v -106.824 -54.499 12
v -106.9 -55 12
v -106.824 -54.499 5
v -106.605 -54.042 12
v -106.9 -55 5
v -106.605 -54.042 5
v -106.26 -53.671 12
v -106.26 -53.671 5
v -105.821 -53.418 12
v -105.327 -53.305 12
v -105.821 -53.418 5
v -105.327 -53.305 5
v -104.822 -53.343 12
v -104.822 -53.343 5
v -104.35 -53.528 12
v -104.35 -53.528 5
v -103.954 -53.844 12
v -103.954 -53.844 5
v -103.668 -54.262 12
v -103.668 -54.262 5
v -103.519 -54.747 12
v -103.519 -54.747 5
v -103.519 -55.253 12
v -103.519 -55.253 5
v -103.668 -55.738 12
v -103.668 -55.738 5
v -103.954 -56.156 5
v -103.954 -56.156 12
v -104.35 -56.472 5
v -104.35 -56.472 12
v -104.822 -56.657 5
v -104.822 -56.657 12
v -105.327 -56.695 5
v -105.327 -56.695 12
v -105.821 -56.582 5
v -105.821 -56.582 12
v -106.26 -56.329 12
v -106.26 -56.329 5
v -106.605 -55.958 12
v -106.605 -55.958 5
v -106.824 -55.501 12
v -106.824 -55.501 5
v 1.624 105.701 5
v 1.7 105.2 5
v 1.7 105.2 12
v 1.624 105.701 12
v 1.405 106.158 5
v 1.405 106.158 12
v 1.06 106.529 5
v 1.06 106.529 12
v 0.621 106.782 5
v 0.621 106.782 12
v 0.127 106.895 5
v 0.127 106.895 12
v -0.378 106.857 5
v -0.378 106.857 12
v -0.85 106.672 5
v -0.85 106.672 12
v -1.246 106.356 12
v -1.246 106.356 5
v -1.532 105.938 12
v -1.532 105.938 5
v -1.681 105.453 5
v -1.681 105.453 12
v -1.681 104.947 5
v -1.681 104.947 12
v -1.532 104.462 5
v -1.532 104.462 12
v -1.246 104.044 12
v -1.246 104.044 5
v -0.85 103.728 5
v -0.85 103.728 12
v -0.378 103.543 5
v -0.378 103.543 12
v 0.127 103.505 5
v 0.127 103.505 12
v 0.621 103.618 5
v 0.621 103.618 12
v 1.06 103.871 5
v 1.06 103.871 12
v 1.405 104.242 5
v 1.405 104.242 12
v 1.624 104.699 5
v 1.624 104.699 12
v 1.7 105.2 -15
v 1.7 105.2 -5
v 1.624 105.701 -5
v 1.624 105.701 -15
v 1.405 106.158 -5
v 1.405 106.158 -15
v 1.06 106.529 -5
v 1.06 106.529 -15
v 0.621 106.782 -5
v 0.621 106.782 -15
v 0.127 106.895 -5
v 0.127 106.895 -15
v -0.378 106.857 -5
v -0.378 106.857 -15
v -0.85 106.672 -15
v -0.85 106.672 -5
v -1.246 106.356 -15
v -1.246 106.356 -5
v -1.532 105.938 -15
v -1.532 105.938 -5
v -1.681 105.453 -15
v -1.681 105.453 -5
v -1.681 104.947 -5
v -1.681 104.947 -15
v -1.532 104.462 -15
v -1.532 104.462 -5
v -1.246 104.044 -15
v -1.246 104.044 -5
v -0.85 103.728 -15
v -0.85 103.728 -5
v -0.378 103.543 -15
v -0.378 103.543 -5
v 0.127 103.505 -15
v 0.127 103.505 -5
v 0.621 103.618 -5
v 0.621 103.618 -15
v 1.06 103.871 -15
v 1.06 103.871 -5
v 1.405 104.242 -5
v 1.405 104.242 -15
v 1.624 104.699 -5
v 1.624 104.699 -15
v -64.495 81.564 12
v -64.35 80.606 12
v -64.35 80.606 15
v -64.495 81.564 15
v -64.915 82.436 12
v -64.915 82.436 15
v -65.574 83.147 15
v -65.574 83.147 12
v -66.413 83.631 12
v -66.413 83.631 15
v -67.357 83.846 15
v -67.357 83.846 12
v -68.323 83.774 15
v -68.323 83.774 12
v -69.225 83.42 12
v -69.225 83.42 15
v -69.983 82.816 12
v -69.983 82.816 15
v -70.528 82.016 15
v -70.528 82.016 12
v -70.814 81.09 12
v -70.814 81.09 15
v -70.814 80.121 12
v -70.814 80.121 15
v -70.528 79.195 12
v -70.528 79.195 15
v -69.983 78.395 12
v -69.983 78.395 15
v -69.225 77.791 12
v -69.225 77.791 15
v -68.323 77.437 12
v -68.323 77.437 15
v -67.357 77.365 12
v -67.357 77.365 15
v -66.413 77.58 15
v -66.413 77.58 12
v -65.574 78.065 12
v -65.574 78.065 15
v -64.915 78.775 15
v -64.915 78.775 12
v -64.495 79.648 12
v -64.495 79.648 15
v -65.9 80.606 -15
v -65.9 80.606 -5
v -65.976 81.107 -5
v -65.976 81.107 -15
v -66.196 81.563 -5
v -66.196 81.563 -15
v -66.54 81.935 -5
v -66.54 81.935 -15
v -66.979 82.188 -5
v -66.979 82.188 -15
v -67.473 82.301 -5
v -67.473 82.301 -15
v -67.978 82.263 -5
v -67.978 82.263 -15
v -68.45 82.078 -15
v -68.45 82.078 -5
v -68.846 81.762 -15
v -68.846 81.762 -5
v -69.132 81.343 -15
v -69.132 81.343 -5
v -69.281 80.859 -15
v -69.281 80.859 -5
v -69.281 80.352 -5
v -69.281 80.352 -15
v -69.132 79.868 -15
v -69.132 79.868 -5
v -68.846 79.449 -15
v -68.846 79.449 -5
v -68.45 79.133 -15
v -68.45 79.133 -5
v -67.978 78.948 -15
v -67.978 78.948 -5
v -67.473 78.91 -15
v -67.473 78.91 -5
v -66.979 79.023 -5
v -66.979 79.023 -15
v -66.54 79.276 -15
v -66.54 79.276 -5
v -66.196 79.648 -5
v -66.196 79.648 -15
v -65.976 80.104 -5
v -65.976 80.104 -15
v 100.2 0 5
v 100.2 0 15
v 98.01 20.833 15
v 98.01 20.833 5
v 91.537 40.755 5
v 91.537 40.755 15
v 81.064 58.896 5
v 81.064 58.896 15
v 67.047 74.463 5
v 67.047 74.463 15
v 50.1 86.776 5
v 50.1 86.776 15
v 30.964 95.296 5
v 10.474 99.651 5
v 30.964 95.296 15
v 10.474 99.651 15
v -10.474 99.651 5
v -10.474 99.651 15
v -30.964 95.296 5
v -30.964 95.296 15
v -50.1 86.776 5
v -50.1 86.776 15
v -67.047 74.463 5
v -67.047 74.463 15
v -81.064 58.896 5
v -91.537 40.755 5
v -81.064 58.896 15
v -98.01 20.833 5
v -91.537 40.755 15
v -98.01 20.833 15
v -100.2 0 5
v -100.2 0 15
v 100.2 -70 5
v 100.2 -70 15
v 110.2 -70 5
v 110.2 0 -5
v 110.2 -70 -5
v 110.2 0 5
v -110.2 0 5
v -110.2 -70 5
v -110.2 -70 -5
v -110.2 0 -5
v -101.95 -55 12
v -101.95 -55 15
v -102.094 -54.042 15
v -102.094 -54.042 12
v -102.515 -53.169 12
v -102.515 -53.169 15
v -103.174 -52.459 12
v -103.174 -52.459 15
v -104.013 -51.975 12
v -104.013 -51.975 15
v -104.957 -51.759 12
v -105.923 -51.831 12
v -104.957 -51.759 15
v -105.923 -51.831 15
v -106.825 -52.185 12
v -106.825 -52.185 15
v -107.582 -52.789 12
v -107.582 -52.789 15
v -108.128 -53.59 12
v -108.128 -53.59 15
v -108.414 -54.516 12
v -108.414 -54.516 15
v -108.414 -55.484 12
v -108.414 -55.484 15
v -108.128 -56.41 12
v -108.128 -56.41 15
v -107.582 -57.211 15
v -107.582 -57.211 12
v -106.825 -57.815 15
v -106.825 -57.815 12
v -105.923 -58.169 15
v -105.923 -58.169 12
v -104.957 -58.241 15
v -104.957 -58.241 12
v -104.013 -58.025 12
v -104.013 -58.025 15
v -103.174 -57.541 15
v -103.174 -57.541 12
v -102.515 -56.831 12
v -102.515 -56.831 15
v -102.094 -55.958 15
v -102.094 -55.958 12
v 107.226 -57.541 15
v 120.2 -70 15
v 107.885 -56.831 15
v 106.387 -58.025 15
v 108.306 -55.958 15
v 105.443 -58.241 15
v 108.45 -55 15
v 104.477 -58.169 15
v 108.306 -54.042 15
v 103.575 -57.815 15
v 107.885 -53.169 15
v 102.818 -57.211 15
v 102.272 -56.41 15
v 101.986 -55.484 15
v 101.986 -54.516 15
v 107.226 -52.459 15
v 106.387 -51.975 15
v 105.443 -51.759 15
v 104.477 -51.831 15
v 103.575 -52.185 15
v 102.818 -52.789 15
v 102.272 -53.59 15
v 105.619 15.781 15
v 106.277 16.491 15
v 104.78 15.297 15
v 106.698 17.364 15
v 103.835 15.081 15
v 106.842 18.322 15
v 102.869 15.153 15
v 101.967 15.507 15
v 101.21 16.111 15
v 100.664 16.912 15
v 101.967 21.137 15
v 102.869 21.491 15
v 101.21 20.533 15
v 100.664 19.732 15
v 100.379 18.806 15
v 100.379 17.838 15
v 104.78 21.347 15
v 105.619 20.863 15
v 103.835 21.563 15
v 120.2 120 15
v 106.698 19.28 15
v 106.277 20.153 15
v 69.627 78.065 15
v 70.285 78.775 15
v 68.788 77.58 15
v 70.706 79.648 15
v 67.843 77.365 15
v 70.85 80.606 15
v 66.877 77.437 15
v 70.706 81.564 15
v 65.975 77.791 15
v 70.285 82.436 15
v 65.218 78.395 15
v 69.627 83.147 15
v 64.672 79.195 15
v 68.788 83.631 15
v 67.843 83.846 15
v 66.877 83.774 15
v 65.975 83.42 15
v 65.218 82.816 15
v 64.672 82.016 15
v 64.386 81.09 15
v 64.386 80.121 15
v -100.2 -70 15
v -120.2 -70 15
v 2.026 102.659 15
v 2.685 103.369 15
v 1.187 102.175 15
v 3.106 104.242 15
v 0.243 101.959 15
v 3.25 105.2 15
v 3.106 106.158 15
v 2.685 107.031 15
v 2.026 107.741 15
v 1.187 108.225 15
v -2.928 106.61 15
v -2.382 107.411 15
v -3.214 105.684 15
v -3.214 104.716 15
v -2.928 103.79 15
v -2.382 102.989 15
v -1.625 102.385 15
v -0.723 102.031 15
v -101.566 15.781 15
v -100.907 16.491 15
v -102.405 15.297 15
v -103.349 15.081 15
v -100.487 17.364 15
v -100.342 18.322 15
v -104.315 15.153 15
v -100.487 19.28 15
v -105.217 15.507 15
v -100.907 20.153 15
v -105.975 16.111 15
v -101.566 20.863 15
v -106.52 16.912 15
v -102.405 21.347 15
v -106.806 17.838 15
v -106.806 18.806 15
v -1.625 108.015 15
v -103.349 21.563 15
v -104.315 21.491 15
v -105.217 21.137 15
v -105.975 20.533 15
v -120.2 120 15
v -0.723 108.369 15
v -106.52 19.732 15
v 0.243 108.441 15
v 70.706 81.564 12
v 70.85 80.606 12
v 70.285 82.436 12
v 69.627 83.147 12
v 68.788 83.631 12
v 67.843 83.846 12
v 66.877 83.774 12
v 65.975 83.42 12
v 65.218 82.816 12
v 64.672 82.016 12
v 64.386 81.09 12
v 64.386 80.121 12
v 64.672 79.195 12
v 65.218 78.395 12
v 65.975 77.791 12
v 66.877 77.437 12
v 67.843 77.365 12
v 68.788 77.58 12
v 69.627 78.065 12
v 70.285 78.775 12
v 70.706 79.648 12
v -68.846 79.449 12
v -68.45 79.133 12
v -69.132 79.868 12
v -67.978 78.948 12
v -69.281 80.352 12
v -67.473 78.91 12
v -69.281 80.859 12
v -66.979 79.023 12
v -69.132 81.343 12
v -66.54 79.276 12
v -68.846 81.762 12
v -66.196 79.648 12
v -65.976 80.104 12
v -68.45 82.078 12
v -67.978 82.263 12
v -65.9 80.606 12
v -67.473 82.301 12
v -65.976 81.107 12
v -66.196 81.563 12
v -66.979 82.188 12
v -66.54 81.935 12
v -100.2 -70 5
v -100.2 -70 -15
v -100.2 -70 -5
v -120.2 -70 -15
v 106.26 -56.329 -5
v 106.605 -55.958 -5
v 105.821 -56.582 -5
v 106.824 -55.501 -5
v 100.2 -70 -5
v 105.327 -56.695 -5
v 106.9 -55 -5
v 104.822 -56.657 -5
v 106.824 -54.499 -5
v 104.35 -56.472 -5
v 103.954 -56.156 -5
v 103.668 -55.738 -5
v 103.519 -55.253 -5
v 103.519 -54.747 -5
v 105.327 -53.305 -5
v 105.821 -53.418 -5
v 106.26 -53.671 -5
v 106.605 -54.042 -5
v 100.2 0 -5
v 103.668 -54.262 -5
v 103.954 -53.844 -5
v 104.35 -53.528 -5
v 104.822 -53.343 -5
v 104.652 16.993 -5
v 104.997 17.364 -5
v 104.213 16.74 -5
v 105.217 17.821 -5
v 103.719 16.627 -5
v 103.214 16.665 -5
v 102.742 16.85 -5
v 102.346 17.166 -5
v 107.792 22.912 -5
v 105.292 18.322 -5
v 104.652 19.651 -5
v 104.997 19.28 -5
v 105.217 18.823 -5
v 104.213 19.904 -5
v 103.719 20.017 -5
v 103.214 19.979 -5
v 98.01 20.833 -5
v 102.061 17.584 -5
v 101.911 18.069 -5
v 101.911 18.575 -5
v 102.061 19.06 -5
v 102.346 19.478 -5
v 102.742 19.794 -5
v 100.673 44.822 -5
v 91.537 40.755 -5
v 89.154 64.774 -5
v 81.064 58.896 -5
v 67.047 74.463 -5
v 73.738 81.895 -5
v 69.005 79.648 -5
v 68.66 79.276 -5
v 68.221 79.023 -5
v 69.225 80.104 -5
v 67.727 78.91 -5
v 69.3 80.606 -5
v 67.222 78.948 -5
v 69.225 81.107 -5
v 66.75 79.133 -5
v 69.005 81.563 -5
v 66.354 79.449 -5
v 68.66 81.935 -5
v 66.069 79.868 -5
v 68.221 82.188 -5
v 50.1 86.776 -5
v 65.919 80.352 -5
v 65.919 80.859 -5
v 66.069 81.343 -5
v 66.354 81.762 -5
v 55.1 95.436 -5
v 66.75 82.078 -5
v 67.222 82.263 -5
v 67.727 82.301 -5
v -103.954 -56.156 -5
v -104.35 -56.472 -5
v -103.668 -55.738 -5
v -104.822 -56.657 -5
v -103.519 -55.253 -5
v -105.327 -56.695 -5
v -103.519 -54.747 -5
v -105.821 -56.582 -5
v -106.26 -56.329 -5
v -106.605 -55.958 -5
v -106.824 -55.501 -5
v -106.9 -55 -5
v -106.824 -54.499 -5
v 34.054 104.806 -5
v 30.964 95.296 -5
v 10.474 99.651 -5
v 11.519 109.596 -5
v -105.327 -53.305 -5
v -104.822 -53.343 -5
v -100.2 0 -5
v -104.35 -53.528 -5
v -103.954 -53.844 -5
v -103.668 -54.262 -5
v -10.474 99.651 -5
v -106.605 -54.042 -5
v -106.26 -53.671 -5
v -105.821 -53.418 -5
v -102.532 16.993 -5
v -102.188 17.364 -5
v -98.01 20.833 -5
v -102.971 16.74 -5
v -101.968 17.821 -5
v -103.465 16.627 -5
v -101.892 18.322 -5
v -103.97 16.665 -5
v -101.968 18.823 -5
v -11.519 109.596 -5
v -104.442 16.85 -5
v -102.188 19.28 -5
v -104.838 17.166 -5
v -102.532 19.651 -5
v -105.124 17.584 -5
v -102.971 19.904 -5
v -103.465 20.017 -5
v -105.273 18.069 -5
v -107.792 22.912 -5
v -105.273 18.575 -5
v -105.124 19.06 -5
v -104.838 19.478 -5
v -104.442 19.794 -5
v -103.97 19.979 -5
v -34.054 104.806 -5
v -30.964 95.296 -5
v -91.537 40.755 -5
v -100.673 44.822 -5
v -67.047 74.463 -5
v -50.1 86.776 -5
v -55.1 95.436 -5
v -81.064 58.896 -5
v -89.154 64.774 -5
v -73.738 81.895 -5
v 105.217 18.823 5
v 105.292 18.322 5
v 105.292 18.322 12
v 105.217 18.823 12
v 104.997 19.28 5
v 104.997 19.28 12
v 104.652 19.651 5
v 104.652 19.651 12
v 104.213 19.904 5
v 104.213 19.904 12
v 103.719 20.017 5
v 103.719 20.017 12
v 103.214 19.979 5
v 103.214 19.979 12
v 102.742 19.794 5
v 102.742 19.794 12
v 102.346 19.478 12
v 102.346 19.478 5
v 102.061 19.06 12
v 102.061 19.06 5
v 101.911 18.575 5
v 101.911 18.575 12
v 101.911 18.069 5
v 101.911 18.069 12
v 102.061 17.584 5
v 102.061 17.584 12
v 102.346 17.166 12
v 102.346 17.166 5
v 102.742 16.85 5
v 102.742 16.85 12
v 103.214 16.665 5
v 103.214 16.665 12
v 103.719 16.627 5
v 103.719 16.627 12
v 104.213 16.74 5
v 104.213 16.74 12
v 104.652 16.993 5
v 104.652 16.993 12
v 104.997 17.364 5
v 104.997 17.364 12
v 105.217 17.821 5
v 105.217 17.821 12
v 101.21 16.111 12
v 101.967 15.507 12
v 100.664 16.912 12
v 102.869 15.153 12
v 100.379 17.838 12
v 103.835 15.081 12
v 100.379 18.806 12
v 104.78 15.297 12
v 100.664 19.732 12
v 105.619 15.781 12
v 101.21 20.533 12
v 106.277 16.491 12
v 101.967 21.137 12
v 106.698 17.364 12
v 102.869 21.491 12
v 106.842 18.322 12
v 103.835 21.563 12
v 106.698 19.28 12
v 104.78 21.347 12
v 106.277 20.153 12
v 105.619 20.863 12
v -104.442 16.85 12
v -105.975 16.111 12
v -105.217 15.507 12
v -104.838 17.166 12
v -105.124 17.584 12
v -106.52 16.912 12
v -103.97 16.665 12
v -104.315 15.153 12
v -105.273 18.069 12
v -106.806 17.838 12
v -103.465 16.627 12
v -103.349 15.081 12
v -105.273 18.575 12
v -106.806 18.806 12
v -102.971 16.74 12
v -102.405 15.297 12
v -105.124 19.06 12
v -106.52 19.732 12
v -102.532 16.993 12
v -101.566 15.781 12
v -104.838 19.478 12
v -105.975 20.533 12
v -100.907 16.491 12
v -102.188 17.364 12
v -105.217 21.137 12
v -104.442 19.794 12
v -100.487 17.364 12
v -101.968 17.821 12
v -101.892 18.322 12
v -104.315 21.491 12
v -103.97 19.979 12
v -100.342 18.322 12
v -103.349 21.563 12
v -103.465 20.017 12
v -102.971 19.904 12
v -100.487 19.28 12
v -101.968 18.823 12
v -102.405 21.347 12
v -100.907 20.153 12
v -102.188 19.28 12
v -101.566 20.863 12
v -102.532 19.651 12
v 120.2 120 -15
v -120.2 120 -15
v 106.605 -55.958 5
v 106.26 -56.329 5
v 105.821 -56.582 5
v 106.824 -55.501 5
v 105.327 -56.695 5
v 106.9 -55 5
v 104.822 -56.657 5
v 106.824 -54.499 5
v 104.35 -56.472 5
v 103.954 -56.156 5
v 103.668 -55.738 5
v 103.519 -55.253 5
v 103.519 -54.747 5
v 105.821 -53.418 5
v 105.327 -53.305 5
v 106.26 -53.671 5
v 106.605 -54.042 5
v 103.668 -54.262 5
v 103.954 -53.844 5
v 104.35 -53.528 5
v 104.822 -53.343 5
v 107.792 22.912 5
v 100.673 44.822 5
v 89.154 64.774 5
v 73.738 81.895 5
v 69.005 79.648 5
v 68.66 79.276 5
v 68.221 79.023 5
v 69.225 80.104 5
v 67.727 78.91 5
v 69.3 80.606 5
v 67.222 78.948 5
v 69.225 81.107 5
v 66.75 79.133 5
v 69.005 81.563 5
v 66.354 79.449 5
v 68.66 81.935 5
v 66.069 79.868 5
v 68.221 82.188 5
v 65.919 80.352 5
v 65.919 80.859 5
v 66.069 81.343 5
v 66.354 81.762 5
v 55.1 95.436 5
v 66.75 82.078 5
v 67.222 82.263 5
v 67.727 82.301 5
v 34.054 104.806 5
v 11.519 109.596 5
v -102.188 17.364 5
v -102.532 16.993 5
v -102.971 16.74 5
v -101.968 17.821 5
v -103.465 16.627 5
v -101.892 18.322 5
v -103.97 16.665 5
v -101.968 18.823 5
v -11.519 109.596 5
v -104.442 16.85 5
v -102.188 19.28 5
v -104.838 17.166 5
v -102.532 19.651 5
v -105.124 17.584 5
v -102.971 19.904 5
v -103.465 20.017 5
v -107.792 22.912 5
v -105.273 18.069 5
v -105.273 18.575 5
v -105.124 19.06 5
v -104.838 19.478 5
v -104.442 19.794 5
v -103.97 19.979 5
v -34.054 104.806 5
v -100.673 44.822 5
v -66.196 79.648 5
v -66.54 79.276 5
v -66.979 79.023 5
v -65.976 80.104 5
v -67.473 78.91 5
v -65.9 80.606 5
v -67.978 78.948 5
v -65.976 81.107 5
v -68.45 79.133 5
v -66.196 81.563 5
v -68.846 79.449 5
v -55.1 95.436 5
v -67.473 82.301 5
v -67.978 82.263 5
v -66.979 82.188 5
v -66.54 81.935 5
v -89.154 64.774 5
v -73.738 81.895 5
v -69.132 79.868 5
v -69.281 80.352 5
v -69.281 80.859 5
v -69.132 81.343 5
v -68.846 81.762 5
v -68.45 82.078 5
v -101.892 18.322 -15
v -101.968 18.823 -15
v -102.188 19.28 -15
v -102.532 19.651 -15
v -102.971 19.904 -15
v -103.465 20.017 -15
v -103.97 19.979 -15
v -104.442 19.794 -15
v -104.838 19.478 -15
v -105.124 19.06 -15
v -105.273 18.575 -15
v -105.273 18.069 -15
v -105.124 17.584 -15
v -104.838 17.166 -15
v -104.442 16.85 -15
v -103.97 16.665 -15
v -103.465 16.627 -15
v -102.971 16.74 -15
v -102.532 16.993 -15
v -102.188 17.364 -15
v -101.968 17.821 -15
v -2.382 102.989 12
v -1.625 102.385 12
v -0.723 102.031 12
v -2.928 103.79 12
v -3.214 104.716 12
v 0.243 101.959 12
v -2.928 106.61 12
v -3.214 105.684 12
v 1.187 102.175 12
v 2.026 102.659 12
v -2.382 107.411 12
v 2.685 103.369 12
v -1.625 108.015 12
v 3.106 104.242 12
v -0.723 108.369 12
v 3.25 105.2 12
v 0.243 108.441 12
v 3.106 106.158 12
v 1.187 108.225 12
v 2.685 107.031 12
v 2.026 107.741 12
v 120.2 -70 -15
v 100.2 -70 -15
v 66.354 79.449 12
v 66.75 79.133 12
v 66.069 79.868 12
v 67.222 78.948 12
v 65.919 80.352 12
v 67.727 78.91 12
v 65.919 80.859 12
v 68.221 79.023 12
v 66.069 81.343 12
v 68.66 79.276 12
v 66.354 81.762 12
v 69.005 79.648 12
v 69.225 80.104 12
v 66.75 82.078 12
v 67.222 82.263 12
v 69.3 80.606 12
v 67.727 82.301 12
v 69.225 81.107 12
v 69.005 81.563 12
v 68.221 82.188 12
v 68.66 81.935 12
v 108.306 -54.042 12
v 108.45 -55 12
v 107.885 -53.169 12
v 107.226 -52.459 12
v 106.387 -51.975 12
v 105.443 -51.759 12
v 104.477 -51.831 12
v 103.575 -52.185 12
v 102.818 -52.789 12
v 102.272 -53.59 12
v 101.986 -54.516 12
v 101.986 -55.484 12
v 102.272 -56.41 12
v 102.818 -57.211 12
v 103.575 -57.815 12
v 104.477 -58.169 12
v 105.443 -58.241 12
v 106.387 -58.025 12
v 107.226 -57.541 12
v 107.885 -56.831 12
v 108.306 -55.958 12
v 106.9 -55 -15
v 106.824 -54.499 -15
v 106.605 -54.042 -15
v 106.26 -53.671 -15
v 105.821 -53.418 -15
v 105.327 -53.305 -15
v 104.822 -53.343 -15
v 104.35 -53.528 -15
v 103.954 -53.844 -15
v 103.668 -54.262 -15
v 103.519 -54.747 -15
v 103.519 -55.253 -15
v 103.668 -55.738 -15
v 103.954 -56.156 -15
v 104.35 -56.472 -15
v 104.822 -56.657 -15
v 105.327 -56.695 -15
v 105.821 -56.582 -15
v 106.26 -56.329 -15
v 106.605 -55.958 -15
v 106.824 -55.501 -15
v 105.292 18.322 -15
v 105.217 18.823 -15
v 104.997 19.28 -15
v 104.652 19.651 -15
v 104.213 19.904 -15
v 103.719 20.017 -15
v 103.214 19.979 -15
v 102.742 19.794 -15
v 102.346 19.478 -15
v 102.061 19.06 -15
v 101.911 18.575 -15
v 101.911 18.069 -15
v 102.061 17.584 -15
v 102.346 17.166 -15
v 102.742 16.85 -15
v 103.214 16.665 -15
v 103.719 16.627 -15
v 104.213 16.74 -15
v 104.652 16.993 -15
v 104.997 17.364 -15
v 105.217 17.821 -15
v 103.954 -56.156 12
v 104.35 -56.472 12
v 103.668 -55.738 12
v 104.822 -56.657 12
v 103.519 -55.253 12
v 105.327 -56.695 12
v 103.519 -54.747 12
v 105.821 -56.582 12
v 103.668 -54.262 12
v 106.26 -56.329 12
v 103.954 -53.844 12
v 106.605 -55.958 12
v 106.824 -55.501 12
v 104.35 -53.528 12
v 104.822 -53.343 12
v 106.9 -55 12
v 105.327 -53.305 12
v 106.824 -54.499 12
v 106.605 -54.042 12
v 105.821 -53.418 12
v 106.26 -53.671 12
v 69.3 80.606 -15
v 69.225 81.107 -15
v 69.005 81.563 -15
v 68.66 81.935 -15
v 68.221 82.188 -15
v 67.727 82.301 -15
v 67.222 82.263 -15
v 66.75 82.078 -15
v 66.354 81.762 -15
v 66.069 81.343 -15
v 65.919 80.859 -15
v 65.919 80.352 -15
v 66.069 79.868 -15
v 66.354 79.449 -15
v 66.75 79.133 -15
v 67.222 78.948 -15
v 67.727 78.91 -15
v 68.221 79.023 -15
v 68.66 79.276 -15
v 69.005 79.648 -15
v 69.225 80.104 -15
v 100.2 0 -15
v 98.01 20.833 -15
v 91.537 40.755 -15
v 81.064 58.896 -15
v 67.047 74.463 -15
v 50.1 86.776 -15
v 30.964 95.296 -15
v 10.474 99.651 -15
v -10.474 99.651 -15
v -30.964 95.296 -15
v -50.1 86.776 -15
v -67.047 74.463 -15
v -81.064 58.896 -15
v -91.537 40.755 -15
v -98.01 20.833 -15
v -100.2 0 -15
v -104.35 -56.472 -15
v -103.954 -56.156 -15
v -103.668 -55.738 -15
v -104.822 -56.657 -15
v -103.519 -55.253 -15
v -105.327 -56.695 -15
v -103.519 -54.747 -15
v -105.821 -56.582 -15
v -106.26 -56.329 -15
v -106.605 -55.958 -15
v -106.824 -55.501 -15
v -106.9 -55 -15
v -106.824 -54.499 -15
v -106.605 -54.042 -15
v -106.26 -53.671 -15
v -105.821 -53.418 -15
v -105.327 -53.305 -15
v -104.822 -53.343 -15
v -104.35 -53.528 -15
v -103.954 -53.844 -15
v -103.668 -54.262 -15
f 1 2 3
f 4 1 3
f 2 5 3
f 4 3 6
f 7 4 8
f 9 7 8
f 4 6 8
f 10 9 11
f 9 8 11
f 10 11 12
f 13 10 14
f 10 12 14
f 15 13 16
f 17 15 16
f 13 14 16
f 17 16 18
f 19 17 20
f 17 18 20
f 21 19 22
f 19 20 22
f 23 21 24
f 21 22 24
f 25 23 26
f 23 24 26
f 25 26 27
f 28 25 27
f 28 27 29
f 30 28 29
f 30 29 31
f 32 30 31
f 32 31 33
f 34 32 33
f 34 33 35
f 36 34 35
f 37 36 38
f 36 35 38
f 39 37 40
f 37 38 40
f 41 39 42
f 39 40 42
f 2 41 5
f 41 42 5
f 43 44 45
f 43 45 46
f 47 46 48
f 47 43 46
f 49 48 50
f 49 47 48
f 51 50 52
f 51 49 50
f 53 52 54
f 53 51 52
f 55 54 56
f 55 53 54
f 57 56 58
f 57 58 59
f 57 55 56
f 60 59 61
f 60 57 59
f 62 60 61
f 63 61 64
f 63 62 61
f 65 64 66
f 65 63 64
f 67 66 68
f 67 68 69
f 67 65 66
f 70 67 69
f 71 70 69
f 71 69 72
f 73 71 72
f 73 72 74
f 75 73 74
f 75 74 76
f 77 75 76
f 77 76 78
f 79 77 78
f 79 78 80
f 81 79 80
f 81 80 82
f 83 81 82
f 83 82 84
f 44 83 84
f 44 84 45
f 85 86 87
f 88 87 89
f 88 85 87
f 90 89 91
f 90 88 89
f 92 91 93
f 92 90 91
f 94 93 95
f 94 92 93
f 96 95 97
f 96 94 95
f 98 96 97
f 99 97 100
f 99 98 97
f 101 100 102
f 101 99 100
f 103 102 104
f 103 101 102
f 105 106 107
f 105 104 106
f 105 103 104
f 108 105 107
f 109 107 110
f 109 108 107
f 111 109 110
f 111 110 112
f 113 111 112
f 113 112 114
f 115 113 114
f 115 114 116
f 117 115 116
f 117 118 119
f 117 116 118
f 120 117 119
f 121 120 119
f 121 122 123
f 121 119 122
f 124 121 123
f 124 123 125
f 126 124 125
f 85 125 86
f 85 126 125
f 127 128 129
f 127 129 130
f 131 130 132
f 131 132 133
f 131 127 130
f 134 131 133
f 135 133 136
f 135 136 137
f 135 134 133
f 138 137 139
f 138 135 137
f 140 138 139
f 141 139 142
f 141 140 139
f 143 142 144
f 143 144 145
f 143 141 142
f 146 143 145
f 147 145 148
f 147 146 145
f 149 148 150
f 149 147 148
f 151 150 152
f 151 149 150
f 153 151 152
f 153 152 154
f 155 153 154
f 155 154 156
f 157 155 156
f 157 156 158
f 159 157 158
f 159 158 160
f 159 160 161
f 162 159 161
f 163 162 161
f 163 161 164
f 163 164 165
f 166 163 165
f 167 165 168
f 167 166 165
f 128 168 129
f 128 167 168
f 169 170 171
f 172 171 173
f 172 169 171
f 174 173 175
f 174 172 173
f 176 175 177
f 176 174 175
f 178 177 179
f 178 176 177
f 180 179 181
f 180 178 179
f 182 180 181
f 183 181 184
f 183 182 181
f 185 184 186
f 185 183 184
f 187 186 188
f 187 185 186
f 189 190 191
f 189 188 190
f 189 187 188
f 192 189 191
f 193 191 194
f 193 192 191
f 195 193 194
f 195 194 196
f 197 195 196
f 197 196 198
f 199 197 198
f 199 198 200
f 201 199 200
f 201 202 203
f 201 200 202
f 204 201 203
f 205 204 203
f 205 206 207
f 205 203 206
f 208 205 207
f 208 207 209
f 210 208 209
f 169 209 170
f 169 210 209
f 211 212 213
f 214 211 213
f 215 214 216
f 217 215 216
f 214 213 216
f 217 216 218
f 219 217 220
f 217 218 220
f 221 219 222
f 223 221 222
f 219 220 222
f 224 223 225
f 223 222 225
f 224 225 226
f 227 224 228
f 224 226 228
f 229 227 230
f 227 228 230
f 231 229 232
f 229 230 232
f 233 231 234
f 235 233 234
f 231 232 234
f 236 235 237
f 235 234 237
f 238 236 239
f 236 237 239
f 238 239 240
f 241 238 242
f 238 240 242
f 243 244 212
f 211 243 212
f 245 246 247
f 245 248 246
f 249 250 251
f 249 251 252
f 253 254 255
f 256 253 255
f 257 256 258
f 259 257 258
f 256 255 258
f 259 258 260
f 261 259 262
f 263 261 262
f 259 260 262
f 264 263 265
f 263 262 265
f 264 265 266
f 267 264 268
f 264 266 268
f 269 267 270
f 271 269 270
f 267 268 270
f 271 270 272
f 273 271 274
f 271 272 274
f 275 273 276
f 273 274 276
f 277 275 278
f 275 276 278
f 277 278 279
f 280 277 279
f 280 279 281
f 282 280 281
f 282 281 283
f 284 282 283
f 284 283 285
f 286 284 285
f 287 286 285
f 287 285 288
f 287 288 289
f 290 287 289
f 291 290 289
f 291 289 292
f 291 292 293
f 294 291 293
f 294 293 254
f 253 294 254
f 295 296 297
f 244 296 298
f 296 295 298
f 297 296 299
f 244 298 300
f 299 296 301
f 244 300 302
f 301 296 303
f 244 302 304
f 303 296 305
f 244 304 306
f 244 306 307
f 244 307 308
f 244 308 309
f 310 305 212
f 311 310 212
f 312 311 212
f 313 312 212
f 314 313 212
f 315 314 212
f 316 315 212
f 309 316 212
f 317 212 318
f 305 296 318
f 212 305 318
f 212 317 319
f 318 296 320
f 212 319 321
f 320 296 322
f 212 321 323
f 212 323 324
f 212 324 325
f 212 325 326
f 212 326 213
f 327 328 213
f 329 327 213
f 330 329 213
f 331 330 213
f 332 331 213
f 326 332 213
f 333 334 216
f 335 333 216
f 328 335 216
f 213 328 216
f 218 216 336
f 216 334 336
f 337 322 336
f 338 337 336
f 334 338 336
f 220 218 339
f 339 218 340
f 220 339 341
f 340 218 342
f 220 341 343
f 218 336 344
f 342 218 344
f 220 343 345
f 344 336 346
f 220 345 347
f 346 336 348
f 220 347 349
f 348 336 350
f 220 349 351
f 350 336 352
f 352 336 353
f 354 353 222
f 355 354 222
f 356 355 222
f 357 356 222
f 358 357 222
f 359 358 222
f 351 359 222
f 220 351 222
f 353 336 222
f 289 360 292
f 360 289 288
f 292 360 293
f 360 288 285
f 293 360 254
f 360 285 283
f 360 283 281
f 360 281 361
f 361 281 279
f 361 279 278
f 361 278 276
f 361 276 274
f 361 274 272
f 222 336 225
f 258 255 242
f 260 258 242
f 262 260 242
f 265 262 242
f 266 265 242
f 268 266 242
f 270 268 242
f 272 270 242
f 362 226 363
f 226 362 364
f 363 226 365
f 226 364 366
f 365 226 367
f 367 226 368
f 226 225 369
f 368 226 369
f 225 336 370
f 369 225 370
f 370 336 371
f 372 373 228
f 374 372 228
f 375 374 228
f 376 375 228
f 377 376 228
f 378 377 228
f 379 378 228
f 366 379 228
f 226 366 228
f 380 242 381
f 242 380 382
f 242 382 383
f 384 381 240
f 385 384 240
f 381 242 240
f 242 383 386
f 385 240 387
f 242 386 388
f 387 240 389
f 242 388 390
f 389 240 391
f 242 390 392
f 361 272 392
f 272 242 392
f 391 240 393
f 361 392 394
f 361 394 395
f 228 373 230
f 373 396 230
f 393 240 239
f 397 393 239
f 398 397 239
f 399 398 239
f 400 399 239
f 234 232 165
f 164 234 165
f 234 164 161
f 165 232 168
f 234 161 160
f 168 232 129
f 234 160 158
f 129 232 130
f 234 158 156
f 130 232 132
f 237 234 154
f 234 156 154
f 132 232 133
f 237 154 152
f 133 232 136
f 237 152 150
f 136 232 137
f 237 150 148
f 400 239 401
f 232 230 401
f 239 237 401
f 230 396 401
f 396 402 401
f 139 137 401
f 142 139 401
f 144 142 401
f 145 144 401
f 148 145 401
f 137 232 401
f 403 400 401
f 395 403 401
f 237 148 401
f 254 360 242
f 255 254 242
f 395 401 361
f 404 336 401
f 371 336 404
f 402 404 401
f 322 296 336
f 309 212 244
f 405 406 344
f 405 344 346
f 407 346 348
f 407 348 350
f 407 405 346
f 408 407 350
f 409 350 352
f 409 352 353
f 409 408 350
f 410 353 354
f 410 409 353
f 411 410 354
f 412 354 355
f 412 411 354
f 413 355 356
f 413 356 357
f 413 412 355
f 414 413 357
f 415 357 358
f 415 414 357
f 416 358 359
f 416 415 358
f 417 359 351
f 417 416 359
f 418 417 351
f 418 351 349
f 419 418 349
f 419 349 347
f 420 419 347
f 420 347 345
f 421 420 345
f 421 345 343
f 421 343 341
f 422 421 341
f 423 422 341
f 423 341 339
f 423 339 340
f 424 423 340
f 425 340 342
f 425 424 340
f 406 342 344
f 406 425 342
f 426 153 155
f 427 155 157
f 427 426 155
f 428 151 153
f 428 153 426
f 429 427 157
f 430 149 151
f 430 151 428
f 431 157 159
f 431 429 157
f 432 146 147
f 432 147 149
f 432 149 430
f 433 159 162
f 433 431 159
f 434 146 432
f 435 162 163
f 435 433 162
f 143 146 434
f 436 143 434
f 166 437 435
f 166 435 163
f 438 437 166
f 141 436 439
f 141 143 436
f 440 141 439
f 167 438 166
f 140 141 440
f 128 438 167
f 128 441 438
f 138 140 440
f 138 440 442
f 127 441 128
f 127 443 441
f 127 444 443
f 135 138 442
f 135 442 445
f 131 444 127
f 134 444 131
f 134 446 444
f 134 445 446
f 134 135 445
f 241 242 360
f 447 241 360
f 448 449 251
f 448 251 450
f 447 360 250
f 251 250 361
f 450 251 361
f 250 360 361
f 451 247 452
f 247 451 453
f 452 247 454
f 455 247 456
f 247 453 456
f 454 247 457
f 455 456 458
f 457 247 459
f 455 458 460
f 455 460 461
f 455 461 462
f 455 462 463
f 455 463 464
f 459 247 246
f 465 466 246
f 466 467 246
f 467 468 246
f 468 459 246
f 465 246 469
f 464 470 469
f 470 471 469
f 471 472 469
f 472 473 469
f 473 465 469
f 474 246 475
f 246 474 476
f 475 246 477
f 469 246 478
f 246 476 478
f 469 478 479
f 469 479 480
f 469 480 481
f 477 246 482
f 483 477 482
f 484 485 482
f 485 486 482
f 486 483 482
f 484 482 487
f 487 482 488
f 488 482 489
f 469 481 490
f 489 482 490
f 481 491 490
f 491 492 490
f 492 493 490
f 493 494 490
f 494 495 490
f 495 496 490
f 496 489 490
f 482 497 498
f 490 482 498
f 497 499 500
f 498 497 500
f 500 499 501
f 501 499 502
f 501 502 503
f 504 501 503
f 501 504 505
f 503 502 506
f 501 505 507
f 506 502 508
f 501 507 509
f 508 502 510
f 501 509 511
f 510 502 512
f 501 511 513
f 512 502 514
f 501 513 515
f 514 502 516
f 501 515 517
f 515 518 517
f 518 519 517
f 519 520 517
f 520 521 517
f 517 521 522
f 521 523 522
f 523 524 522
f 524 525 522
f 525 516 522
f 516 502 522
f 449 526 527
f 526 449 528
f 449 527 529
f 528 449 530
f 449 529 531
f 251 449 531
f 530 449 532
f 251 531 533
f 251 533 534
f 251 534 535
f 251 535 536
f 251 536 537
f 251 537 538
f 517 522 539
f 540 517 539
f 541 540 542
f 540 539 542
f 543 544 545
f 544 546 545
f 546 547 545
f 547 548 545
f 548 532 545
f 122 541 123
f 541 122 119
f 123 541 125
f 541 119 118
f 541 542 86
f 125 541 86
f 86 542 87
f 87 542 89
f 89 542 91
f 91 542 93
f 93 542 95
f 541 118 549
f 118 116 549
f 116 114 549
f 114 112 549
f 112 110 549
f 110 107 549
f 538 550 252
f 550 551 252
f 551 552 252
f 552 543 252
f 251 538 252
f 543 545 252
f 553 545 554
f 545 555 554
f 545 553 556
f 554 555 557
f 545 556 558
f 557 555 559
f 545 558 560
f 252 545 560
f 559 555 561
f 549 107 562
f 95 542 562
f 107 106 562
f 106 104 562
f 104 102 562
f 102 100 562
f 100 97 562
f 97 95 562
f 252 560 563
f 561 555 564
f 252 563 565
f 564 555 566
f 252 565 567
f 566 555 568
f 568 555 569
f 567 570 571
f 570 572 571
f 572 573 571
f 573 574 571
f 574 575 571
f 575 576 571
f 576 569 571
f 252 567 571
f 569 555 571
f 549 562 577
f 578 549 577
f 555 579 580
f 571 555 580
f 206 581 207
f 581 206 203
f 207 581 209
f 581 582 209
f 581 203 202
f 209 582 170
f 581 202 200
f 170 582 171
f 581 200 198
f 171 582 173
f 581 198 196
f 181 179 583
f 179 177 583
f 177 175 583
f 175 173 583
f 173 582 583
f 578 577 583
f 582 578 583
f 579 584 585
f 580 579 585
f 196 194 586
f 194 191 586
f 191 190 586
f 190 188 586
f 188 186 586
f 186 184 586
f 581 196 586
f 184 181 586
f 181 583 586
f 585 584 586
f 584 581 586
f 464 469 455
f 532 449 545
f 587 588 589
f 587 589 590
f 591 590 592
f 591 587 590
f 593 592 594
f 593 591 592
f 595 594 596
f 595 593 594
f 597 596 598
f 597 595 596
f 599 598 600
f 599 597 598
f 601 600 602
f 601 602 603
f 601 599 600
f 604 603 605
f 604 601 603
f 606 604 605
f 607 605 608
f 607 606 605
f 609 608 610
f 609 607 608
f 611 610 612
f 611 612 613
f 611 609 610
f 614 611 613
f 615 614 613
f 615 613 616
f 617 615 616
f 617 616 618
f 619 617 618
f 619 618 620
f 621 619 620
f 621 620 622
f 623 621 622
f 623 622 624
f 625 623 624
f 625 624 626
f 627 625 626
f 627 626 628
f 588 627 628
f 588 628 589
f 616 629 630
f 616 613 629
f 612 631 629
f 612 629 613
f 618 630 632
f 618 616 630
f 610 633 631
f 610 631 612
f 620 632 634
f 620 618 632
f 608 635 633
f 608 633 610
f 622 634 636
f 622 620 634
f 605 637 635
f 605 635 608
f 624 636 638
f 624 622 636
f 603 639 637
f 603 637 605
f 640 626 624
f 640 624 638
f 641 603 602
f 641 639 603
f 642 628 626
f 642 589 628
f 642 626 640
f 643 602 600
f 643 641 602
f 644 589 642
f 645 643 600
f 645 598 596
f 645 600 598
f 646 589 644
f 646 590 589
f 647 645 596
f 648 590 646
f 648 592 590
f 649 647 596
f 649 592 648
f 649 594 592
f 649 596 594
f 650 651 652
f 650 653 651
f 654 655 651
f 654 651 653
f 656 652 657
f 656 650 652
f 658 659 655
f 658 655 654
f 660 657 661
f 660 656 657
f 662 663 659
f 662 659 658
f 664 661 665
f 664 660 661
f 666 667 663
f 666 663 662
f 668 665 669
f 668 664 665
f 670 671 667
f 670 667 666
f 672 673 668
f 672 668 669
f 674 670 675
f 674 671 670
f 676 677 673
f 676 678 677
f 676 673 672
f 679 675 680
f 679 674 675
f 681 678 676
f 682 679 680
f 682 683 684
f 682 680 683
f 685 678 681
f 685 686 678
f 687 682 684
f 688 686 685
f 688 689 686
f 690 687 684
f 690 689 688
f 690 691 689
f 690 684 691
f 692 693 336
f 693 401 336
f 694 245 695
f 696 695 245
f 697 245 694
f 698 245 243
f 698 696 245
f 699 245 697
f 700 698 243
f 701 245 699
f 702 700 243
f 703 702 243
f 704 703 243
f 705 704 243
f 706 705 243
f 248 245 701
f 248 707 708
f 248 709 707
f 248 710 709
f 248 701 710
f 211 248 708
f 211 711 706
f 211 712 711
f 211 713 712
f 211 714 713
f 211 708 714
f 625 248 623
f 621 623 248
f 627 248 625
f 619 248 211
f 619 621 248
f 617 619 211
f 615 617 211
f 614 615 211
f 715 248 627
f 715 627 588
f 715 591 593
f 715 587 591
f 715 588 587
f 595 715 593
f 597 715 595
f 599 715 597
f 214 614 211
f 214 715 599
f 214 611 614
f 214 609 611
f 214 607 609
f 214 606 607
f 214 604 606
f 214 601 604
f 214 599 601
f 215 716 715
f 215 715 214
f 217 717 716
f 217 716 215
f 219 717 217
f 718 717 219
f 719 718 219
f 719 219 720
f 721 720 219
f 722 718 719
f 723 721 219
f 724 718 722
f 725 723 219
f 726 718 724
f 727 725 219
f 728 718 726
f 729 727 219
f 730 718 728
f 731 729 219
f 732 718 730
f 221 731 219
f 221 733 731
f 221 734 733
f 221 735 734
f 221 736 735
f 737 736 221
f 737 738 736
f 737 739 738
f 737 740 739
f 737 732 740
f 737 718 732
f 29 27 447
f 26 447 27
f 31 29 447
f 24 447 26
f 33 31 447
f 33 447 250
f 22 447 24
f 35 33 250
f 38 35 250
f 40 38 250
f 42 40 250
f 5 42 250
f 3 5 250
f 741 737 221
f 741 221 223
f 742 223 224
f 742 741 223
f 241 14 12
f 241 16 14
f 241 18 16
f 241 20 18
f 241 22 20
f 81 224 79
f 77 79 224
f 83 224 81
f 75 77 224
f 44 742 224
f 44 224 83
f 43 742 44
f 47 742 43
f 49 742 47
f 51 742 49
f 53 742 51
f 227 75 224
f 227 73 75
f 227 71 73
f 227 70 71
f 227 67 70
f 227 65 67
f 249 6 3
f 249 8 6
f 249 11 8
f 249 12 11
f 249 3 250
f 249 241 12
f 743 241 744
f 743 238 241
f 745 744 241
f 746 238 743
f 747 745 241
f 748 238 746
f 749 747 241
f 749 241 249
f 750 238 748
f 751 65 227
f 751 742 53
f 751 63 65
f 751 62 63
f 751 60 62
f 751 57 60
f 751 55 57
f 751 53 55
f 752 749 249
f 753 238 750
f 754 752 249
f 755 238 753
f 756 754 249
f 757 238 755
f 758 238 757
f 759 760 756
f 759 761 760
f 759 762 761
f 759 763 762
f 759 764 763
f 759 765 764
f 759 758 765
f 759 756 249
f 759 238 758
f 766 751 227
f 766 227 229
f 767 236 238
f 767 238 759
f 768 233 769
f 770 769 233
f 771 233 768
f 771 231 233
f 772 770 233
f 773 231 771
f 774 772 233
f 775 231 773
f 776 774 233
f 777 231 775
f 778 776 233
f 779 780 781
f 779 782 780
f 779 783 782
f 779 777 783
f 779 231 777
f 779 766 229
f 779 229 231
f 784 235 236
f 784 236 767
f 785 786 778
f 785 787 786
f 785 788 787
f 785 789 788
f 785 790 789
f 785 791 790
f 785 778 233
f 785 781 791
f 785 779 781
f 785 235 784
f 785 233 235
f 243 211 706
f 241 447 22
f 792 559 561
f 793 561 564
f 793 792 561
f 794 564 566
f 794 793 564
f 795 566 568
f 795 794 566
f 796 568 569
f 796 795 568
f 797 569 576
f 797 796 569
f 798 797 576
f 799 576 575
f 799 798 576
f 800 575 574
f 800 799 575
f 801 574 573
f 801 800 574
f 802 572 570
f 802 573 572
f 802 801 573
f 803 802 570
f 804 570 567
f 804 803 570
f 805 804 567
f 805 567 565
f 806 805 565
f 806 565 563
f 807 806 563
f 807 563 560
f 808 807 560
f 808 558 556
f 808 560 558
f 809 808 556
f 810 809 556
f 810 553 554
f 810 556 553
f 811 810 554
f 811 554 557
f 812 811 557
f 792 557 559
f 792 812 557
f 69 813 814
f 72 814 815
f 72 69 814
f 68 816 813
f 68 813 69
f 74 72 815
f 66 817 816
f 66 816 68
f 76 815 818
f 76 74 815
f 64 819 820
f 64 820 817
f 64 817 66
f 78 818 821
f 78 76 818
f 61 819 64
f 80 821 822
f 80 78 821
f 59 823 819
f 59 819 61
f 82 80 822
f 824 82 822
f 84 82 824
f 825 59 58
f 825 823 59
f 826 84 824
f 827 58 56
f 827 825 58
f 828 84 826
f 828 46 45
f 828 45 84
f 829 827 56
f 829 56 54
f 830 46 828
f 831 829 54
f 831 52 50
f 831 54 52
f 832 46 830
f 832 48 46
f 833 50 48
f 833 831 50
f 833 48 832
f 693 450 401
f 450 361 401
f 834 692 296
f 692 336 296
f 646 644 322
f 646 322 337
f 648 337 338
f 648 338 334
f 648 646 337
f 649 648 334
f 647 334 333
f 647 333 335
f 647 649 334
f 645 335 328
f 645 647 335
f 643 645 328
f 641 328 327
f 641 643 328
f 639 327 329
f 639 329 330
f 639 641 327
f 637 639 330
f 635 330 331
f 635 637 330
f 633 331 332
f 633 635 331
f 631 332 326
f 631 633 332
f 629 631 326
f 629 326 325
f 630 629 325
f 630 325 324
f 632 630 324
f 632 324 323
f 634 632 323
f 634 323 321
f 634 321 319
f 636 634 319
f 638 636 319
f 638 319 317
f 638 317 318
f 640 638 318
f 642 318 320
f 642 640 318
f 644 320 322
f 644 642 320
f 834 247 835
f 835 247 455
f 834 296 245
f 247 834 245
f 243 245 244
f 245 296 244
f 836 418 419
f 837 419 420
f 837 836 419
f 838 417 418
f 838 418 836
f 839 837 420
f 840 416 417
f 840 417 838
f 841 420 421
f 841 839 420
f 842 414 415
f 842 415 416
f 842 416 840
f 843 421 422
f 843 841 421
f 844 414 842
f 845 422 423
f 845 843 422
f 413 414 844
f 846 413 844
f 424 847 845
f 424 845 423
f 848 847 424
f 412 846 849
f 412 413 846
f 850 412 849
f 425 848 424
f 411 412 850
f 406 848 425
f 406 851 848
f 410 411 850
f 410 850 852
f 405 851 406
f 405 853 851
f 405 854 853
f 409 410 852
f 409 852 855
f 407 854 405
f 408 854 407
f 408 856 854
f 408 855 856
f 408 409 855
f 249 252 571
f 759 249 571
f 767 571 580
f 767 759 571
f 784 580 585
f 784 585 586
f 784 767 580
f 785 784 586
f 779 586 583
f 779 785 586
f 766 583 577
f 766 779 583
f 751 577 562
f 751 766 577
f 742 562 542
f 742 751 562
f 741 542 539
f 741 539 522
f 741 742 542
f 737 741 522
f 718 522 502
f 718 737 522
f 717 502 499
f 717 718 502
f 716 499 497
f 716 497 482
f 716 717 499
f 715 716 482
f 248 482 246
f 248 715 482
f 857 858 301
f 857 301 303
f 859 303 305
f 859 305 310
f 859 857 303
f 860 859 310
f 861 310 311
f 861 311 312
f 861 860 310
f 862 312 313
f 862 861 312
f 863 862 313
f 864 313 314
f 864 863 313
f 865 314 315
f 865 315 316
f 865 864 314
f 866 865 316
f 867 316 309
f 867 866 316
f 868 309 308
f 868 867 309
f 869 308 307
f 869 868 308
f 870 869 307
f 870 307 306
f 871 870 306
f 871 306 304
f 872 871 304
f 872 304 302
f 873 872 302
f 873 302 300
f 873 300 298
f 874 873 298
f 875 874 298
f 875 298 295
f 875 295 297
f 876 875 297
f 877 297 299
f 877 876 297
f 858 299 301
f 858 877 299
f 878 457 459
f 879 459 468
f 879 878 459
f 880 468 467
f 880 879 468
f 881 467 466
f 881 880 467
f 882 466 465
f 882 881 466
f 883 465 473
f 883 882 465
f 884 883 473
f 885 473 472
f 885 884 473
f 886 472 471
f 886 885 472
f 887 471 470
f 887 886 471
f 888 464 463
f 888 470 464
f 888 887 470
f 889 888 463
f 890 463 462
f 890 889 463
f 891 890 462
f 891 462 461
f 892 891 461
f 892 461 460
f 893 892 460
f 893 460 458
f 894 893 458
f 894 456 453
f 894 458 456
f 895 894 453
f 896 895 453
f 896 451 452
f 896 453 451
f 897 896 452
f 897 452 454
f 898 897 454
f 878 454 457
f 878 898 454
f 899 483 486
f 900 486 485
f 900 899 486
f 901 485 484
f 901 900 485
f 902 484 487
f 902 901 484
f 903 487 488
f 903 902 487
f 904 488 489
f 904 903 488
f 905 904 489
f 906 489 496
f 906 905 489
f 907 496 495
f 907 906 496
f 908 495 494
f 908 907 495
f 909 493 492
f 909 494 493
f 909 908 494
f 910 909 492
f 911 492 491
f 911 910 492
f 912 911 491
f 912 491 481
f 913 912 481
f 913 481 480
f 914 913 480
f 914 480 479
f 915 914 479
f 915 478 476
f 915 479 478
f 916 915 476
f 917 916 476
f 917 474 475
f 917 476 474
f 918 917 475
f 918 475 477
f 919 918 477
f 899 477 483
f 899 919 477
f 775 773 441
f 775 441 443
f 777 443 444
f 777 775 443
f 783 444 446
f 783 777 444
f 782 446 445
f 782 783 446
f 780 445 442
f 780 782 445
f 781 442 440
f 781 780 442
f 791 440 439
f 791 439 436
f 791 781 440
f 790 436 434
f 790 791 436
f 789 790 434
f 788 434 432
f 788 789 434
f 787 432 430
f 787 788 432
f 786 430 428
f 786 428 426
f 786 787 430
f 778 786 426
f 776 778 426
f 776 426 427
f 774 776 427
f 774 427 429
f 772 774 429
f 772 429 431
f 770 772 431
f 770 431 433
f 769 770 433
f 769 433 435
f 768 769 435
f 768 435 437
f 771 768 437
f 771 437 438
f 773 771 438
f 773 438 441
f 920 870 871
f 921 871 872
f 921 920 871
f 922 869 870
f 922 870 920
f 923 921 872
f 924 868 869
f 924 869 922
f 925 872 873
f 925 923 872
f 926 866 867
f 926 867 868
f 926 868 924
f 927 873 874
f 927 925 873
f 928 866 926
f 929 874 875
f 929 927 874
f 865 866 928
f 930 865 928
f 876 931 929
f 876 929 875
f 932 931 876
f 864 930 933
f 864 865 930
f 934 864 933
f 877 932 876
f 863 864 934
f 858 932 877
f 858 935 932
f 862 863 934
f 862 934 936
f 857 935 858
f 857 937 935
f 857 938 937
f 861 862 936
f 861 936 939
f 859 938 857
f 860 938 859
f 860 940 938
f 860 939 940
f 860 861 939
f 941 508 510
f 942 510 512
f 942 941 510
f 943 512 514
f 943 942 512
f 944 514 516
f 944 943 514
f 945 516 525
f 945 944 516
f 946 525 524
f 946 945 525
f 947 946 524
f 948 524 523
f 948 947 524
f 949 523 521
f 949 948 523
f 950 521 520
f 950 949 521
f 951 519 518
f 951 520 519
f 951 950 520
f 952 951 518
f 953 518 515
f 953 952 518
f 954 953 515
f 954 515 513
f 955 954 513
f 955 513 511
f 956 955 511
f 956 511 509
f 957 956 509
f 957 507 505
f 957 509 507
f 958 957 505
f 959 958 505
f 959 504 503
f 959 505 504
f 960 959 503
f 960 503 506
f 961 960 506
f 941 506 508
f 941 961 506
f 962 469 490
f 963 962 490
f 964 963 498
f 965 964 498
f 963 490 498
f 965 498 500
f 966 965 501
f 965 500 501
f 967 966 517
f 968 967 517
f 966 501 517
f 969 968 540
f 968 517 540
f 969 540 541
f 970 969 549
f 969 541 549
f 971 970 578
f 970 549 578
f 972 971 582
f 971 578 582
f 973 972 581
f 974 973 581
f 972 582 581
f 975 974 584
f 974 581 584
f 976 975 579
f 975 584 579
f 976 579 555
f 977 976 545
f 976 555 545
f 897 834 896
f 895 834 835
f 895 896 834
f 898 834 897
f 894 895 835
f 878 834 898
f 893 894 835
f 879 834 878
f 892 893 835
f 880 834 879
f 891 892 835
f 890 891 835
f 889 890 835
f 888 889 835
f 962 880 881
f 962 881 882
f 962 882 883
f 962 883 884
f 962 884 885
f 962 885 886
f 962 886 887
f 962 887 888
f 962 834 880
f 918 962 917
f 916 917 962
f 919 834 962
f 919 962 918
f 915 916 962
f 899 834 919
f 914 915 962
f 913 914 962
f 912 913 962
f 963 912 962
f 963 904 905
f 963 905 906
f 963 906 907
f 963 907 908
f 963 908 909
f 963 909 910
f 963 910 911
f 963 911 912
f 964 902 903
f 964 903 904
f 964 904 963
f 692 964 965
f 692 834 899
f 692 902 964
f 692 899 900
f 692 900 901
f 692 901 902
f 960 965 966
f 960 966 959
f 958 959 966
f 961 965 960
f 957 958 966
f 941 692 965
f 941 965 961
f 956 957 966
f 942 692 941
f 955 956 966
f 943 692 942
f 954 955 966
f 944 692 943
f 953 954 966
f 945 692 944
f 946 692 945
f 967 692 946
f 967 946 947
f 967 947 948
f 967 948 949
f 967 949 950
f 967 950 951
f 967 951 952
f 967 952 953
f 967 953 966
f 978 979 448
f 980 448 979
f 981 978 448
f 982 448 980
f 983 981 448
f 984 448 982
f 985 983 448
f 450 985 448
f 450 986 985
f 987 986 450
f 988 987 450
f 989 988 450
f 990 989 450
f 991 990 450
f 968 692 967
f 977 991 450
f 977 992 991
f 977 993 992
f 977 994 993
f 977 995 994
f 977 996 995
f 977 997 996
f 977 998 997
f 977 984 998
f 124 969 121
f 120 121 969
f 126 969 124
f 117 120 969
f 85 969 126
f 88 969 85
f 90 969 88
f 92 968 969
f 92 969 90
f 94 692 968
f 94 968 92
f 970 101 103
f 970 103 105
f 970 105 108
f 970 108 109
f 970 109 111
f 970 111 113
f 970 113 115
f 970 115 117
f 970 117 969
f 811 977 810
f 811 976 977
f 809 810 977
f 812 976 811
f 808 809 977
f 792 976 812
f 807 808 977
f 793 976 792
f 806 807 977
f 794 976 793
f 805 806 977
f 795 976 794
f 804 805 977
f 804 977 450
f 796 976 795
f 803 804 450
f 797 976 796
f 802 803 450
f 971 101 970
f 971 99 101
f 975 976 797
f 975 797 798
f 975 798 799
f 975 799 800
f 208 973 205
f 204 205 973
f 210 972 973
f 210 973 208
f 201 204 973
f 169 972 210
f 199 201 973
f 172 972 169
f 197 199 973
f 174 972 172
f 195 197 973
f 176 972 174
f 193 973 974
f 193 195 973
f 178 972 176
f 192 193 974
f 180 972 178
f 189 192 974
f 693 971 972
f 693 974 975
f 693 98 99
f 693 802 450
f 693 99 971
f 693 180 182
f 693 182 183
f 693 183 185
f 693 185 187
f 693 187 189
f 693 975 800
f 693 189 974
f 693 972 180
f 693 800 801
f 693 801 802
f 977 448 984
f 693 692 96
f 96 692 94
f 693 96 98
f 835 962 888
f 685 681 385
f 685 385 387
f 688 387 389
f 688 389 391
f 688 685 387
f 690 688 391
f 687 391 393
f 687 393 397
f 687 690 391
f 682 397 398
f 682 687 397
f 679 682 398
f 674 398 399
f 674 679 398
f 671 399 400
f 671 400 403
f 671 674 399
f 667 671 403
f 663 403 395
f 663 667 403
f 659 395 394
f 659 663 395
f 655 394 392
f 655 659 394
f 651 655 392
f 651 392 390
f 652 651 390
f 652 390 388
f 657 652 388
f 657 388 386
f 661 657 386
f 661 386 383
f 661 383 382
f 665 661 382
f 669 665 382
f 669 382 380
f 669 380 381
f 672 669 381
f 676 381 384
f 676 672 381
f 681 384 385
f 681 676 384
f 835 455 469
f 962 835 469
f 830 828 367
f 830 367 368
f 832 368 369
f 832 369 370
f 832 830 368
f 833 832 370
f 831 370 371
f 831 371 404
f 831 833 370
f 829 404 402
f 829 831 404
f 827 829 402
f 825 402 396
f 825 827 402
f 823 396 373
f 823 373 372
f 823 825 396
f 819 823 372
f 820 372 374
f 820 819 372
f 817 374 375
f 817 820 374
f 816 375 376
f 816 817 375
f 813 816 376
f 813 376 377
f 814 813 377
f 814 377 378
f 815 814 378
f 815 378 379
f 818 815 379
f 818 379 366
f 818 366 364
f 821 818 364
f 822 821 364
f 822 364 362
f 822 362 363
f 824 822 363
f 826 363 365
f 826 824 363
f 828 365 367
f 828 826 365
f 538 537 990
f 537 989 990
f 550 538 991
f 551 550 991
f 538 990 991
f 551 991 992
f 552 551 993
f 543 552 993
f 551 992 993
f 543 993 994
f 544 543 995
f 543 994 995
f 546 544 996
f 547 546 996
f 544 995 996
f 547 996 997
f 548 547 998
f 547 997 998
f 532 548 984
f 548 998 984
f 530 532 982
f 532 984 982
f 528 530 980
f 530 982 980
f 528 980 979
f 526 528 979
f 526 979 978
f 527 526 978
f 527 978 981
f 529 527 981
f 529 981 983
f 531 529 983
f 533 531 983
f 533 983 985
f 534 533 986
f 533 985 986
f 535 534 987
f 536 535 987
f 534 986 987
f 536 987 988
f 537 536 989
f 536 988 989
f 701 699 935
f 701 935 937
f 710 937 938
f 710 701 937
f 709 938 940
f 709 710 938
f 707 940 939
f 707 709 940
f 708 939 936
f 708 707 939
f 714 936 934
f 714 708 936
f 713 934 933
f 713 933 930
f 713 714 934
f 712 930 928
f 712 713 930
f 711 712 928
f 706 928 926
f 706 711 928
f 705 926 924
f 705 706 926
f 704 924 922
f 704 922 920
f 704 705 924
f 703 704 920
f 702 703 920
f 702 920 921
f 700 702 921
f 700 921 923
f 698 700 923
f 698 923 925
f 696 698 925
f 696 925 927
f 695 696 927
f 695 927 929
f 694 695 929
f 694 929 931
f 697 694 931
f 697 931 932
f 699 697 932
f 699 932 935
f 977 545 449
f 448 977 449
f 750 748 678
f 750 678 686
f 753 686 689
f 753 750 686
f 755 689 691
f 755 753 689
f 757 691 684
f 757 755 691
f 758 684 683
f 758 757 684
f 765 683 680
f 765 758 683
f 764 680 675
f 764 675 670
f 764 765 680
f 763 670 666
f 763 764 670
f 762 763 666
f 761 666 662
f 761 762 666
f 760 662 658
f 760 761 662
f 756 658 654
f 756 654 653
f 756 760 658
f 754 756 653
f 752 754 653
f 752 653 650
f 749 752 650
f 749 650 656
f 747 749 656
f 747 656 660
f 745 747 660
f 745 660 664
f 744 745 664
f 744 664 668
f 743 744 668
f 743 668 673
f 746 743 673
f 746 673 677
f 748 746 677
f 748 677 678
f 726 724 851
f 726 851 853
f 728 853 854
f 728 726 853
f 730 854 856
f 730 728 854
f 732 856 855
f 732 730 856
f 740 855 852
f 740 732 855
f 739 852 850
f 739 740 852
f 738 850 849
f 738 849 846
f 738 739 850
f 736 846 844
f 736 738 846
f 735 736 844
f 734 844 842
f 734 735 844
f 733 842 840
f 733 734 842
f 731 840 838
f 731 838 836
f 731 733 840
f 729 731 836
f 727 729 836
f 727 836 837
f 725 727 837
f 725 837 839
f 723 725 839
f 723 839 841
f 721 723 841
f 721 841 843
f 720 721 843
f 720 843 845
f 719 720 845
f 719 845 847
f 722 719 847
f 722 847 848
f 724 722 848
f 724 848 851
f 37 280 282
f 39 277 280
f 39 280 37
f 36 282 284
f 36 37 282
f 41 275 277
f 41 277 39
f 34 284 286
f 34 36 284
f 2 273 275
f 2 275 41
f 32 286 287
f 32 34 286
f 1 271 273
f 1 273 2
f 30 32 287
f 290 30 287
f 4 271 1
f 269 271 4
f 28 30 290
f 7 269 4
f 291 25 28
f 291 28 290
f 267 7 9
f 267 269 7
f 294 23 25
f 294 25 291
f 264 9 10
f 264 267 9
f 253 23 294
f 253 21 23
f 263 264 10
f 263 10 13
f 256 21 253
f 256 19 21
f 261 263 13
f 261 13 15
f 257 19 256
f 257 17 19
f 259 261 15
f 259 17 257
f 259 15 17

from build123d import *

# Parameters (mm, degrees)
BOSS_EXTRUDE1_DEPTH            = 15
CUT_EXTRUDE1_DEPTH             = 5
CBORE_FOR_M3_SHCS1_D           = 3.4
CBORE_FOR_M3_SHCS1_CBORE_D     = 6.5
CBORE_FOR_M3_SHCS1_CBORE_DEPTH = 3
CRVPATTERN1_START              = -15
CRVPATTERN1_OUTLINE_R          = 1.7
CRVPATTERN1_DEPTH              = 30
CRVPATTERN1_START_2            = 12
CRVPATTERN1_2_OUTLINE_R        = 3.25
CRVPATTERN1_2_OUTLINE_R_2      = 1.7
CRVPATTERN1_2_DEPTH            = 3


# Read off the part's stored shape, not the designer's step: CrvPattern1
with BuildPart() as part:
    # Sketch1 → Boss-Extrude1 (new, symmetric)
    with BuildSketch(Plane.XY):
        with BuildLine():
            Line((-100.2, 0), (-100.2, -70))
            Line((-100.2, -70), (-120.2, -70))
            Line((-120.2, -70), (-120.2, 120))
            Line((-120.2, 120), (120.2, 120))
            Line((120.2, 120), (120.2, -70))
            Line((120.2, -70), (100.2, -70))
            Line((100.2, -70), (100.2, 0))
            ThreePointArc((100.2, 0), (0, 100.2), (-100.2, 0))
        make_face()
    extrude(amount=BOSS_EXTRUDE1_DEPTH, both=True)

    # Sketch2 → Cut-Extrude1 (cut, symmetric)
    with BuildSketch(Plane.XY):
        with BuildLine():
            Line((-110.2, -70), (-110.2, 0))
            ThreePointArc((-110.2, 0), (0, 110.2), (110.2, 0))
            Line((110.2, 0), (110.2, -70))
            Line((110.2, -70), (100.2, -70))
            Line((100.2, -70), (100.2, 0))
            ThreePointArc((100.2, 0), (0, 100.2), (-100.2, 0))
            Line((-100.2, 0), (-100.2, -70))
            Line((-100.2, -70), (-110.2, -70))
        make_face()
    extrude(amount=CUT_EXTRUDE1_DEPTH, both=True, mode=Mode.SUBTRACT)

    # CBORE for M3 SHCS1 (through all)
    with Locations(Plane.XY.offset(15)):
        with Locations((-105.2, -55)):
            CounterBoreHole(CBORE_FOR_M3_SHCS1_D / 2, CBORE_FOR_M3_SHCS1_CBORE_D / 2, CBORE_FOR_M3_SHCS1_CBORE_DEPTH)

    # CrvPattern1 outline → CrvPattern1 (cut)
    with BuildSketch(Plane.XY.offset(CRVPATTERN1_START)):
        with Locations((-103.59220022, 18.322010084)):
            Circle(CRVPATTERN1_OUTLINE_R)
        with Locations((-67.600164716, 80.605568855)):
            Circle(CRVPATTERN1_OUTLINE_R)
        with Locations((0, 105.2)):
            Circle(CRVPATTERN1_OUTLINE_R)
        with Locations((67.600164716, 80.605568855)):
            Circle(CRVPATTERN1_OUTLINE_R)
        with Locations((103.59220022, 18.322010084)):
            Circle(CRVPATTERN1_OUTLINE_R)
        with Locations((105.2, -55)):
            Circle(CRVPATTERN1_OUTLINE_R)
    extrude(amount=CRVPATTERN1_DEPTH, mode=Mode.SUBTRACT)

    # CrvPattern1 2 outline → CrvPattern1 2 (cut)
    # profile 1 of 6: a face of its own
    with BuildSketch(Plane.XY.offset(CRVPATTERN1_START_2)):
        with Locations((-103.59220022, 18.322010084)):
            Circle(CRVPATTERN1_2_OUTLINE_R)
        with Locations((-103.59220022, 18.322010084)):
            Circle(CRVPATTERN1_2_OUTLINE_R_2, mode=Mode.SUBTRACT)
    # profile 2 of 6: a face of its own
    with BuildSketch(Plane.XY.offset(CRVPATTERN1_START_2)):
        with Locations((-67.600164716, 80.605568855)):
            Circle(CRVPATTERN1_2_OUTLINE_R)
        with Locations((-67.600164716, 80.605568855)):
            Circle(CRVPATTERN1_2_OUTLINE_R_2, mode=Mode.SUBTRACT)
    # profile 3 of 6: a face of its own
    with BuildSketch(Plane.XY.offset(CRVPATTERN1_START_2)):
        with Locations((0, 105.2)):
            Circle(CRVPATTERN1_2_OUTLINE_R)
        with Locations((0, 105.2)):
            Circle(CRVPATTERN1_2_OUTLINE_R_2, mode=Mode.SUBTRACT)
    # profile 4 of 6: a face of its own
    with BuildSketch(Plane.XY.offset(CRVPATTERN1_START_2)):
        with Locations((67.600164716, 80.605568855)):
            Circle(CRVPATTERN1_2_OUTLINE_R)
        with Locations((67.600164716, 80.605568855)):
            Circle(CRVPATTERN1_2_OUTLINE_R_2, mode=Mode.SUBTRACT)
    # profile 5 of 6: a face of its own
    with BuildSketch(Plane.XY.offset(CRVPATTERN1_START_2)):
        with Locations((103.59220022, 18.322010084)):
            Circle(CRVPATTERN1_2_OUTLINE_R)
        with Locations((103.59220022, 18.322010084)):
            Circle(CRVPATTERN1_2_OUTLINE_R_2, mode=Mode.SUBTRACT)
    # profile 6 of 6: a face of its own
    with BuildSketch(Plane.XY.offset(CRVPATTERN1_START_2)):
        with Locations((105.2, -55)):
            Circle(CRVPATTERN1_2_OUTLINE_R)
        with Locations((105.2, -55)):
            Circle(CRVPATTERN1_2_OUTLINE_R_2, mode=Mode.SUBTRACT)
    extrude(amount=CRVPATTERN1_2_DEPTH, mode=Mode.SUBTRACT)


solid = part.part
